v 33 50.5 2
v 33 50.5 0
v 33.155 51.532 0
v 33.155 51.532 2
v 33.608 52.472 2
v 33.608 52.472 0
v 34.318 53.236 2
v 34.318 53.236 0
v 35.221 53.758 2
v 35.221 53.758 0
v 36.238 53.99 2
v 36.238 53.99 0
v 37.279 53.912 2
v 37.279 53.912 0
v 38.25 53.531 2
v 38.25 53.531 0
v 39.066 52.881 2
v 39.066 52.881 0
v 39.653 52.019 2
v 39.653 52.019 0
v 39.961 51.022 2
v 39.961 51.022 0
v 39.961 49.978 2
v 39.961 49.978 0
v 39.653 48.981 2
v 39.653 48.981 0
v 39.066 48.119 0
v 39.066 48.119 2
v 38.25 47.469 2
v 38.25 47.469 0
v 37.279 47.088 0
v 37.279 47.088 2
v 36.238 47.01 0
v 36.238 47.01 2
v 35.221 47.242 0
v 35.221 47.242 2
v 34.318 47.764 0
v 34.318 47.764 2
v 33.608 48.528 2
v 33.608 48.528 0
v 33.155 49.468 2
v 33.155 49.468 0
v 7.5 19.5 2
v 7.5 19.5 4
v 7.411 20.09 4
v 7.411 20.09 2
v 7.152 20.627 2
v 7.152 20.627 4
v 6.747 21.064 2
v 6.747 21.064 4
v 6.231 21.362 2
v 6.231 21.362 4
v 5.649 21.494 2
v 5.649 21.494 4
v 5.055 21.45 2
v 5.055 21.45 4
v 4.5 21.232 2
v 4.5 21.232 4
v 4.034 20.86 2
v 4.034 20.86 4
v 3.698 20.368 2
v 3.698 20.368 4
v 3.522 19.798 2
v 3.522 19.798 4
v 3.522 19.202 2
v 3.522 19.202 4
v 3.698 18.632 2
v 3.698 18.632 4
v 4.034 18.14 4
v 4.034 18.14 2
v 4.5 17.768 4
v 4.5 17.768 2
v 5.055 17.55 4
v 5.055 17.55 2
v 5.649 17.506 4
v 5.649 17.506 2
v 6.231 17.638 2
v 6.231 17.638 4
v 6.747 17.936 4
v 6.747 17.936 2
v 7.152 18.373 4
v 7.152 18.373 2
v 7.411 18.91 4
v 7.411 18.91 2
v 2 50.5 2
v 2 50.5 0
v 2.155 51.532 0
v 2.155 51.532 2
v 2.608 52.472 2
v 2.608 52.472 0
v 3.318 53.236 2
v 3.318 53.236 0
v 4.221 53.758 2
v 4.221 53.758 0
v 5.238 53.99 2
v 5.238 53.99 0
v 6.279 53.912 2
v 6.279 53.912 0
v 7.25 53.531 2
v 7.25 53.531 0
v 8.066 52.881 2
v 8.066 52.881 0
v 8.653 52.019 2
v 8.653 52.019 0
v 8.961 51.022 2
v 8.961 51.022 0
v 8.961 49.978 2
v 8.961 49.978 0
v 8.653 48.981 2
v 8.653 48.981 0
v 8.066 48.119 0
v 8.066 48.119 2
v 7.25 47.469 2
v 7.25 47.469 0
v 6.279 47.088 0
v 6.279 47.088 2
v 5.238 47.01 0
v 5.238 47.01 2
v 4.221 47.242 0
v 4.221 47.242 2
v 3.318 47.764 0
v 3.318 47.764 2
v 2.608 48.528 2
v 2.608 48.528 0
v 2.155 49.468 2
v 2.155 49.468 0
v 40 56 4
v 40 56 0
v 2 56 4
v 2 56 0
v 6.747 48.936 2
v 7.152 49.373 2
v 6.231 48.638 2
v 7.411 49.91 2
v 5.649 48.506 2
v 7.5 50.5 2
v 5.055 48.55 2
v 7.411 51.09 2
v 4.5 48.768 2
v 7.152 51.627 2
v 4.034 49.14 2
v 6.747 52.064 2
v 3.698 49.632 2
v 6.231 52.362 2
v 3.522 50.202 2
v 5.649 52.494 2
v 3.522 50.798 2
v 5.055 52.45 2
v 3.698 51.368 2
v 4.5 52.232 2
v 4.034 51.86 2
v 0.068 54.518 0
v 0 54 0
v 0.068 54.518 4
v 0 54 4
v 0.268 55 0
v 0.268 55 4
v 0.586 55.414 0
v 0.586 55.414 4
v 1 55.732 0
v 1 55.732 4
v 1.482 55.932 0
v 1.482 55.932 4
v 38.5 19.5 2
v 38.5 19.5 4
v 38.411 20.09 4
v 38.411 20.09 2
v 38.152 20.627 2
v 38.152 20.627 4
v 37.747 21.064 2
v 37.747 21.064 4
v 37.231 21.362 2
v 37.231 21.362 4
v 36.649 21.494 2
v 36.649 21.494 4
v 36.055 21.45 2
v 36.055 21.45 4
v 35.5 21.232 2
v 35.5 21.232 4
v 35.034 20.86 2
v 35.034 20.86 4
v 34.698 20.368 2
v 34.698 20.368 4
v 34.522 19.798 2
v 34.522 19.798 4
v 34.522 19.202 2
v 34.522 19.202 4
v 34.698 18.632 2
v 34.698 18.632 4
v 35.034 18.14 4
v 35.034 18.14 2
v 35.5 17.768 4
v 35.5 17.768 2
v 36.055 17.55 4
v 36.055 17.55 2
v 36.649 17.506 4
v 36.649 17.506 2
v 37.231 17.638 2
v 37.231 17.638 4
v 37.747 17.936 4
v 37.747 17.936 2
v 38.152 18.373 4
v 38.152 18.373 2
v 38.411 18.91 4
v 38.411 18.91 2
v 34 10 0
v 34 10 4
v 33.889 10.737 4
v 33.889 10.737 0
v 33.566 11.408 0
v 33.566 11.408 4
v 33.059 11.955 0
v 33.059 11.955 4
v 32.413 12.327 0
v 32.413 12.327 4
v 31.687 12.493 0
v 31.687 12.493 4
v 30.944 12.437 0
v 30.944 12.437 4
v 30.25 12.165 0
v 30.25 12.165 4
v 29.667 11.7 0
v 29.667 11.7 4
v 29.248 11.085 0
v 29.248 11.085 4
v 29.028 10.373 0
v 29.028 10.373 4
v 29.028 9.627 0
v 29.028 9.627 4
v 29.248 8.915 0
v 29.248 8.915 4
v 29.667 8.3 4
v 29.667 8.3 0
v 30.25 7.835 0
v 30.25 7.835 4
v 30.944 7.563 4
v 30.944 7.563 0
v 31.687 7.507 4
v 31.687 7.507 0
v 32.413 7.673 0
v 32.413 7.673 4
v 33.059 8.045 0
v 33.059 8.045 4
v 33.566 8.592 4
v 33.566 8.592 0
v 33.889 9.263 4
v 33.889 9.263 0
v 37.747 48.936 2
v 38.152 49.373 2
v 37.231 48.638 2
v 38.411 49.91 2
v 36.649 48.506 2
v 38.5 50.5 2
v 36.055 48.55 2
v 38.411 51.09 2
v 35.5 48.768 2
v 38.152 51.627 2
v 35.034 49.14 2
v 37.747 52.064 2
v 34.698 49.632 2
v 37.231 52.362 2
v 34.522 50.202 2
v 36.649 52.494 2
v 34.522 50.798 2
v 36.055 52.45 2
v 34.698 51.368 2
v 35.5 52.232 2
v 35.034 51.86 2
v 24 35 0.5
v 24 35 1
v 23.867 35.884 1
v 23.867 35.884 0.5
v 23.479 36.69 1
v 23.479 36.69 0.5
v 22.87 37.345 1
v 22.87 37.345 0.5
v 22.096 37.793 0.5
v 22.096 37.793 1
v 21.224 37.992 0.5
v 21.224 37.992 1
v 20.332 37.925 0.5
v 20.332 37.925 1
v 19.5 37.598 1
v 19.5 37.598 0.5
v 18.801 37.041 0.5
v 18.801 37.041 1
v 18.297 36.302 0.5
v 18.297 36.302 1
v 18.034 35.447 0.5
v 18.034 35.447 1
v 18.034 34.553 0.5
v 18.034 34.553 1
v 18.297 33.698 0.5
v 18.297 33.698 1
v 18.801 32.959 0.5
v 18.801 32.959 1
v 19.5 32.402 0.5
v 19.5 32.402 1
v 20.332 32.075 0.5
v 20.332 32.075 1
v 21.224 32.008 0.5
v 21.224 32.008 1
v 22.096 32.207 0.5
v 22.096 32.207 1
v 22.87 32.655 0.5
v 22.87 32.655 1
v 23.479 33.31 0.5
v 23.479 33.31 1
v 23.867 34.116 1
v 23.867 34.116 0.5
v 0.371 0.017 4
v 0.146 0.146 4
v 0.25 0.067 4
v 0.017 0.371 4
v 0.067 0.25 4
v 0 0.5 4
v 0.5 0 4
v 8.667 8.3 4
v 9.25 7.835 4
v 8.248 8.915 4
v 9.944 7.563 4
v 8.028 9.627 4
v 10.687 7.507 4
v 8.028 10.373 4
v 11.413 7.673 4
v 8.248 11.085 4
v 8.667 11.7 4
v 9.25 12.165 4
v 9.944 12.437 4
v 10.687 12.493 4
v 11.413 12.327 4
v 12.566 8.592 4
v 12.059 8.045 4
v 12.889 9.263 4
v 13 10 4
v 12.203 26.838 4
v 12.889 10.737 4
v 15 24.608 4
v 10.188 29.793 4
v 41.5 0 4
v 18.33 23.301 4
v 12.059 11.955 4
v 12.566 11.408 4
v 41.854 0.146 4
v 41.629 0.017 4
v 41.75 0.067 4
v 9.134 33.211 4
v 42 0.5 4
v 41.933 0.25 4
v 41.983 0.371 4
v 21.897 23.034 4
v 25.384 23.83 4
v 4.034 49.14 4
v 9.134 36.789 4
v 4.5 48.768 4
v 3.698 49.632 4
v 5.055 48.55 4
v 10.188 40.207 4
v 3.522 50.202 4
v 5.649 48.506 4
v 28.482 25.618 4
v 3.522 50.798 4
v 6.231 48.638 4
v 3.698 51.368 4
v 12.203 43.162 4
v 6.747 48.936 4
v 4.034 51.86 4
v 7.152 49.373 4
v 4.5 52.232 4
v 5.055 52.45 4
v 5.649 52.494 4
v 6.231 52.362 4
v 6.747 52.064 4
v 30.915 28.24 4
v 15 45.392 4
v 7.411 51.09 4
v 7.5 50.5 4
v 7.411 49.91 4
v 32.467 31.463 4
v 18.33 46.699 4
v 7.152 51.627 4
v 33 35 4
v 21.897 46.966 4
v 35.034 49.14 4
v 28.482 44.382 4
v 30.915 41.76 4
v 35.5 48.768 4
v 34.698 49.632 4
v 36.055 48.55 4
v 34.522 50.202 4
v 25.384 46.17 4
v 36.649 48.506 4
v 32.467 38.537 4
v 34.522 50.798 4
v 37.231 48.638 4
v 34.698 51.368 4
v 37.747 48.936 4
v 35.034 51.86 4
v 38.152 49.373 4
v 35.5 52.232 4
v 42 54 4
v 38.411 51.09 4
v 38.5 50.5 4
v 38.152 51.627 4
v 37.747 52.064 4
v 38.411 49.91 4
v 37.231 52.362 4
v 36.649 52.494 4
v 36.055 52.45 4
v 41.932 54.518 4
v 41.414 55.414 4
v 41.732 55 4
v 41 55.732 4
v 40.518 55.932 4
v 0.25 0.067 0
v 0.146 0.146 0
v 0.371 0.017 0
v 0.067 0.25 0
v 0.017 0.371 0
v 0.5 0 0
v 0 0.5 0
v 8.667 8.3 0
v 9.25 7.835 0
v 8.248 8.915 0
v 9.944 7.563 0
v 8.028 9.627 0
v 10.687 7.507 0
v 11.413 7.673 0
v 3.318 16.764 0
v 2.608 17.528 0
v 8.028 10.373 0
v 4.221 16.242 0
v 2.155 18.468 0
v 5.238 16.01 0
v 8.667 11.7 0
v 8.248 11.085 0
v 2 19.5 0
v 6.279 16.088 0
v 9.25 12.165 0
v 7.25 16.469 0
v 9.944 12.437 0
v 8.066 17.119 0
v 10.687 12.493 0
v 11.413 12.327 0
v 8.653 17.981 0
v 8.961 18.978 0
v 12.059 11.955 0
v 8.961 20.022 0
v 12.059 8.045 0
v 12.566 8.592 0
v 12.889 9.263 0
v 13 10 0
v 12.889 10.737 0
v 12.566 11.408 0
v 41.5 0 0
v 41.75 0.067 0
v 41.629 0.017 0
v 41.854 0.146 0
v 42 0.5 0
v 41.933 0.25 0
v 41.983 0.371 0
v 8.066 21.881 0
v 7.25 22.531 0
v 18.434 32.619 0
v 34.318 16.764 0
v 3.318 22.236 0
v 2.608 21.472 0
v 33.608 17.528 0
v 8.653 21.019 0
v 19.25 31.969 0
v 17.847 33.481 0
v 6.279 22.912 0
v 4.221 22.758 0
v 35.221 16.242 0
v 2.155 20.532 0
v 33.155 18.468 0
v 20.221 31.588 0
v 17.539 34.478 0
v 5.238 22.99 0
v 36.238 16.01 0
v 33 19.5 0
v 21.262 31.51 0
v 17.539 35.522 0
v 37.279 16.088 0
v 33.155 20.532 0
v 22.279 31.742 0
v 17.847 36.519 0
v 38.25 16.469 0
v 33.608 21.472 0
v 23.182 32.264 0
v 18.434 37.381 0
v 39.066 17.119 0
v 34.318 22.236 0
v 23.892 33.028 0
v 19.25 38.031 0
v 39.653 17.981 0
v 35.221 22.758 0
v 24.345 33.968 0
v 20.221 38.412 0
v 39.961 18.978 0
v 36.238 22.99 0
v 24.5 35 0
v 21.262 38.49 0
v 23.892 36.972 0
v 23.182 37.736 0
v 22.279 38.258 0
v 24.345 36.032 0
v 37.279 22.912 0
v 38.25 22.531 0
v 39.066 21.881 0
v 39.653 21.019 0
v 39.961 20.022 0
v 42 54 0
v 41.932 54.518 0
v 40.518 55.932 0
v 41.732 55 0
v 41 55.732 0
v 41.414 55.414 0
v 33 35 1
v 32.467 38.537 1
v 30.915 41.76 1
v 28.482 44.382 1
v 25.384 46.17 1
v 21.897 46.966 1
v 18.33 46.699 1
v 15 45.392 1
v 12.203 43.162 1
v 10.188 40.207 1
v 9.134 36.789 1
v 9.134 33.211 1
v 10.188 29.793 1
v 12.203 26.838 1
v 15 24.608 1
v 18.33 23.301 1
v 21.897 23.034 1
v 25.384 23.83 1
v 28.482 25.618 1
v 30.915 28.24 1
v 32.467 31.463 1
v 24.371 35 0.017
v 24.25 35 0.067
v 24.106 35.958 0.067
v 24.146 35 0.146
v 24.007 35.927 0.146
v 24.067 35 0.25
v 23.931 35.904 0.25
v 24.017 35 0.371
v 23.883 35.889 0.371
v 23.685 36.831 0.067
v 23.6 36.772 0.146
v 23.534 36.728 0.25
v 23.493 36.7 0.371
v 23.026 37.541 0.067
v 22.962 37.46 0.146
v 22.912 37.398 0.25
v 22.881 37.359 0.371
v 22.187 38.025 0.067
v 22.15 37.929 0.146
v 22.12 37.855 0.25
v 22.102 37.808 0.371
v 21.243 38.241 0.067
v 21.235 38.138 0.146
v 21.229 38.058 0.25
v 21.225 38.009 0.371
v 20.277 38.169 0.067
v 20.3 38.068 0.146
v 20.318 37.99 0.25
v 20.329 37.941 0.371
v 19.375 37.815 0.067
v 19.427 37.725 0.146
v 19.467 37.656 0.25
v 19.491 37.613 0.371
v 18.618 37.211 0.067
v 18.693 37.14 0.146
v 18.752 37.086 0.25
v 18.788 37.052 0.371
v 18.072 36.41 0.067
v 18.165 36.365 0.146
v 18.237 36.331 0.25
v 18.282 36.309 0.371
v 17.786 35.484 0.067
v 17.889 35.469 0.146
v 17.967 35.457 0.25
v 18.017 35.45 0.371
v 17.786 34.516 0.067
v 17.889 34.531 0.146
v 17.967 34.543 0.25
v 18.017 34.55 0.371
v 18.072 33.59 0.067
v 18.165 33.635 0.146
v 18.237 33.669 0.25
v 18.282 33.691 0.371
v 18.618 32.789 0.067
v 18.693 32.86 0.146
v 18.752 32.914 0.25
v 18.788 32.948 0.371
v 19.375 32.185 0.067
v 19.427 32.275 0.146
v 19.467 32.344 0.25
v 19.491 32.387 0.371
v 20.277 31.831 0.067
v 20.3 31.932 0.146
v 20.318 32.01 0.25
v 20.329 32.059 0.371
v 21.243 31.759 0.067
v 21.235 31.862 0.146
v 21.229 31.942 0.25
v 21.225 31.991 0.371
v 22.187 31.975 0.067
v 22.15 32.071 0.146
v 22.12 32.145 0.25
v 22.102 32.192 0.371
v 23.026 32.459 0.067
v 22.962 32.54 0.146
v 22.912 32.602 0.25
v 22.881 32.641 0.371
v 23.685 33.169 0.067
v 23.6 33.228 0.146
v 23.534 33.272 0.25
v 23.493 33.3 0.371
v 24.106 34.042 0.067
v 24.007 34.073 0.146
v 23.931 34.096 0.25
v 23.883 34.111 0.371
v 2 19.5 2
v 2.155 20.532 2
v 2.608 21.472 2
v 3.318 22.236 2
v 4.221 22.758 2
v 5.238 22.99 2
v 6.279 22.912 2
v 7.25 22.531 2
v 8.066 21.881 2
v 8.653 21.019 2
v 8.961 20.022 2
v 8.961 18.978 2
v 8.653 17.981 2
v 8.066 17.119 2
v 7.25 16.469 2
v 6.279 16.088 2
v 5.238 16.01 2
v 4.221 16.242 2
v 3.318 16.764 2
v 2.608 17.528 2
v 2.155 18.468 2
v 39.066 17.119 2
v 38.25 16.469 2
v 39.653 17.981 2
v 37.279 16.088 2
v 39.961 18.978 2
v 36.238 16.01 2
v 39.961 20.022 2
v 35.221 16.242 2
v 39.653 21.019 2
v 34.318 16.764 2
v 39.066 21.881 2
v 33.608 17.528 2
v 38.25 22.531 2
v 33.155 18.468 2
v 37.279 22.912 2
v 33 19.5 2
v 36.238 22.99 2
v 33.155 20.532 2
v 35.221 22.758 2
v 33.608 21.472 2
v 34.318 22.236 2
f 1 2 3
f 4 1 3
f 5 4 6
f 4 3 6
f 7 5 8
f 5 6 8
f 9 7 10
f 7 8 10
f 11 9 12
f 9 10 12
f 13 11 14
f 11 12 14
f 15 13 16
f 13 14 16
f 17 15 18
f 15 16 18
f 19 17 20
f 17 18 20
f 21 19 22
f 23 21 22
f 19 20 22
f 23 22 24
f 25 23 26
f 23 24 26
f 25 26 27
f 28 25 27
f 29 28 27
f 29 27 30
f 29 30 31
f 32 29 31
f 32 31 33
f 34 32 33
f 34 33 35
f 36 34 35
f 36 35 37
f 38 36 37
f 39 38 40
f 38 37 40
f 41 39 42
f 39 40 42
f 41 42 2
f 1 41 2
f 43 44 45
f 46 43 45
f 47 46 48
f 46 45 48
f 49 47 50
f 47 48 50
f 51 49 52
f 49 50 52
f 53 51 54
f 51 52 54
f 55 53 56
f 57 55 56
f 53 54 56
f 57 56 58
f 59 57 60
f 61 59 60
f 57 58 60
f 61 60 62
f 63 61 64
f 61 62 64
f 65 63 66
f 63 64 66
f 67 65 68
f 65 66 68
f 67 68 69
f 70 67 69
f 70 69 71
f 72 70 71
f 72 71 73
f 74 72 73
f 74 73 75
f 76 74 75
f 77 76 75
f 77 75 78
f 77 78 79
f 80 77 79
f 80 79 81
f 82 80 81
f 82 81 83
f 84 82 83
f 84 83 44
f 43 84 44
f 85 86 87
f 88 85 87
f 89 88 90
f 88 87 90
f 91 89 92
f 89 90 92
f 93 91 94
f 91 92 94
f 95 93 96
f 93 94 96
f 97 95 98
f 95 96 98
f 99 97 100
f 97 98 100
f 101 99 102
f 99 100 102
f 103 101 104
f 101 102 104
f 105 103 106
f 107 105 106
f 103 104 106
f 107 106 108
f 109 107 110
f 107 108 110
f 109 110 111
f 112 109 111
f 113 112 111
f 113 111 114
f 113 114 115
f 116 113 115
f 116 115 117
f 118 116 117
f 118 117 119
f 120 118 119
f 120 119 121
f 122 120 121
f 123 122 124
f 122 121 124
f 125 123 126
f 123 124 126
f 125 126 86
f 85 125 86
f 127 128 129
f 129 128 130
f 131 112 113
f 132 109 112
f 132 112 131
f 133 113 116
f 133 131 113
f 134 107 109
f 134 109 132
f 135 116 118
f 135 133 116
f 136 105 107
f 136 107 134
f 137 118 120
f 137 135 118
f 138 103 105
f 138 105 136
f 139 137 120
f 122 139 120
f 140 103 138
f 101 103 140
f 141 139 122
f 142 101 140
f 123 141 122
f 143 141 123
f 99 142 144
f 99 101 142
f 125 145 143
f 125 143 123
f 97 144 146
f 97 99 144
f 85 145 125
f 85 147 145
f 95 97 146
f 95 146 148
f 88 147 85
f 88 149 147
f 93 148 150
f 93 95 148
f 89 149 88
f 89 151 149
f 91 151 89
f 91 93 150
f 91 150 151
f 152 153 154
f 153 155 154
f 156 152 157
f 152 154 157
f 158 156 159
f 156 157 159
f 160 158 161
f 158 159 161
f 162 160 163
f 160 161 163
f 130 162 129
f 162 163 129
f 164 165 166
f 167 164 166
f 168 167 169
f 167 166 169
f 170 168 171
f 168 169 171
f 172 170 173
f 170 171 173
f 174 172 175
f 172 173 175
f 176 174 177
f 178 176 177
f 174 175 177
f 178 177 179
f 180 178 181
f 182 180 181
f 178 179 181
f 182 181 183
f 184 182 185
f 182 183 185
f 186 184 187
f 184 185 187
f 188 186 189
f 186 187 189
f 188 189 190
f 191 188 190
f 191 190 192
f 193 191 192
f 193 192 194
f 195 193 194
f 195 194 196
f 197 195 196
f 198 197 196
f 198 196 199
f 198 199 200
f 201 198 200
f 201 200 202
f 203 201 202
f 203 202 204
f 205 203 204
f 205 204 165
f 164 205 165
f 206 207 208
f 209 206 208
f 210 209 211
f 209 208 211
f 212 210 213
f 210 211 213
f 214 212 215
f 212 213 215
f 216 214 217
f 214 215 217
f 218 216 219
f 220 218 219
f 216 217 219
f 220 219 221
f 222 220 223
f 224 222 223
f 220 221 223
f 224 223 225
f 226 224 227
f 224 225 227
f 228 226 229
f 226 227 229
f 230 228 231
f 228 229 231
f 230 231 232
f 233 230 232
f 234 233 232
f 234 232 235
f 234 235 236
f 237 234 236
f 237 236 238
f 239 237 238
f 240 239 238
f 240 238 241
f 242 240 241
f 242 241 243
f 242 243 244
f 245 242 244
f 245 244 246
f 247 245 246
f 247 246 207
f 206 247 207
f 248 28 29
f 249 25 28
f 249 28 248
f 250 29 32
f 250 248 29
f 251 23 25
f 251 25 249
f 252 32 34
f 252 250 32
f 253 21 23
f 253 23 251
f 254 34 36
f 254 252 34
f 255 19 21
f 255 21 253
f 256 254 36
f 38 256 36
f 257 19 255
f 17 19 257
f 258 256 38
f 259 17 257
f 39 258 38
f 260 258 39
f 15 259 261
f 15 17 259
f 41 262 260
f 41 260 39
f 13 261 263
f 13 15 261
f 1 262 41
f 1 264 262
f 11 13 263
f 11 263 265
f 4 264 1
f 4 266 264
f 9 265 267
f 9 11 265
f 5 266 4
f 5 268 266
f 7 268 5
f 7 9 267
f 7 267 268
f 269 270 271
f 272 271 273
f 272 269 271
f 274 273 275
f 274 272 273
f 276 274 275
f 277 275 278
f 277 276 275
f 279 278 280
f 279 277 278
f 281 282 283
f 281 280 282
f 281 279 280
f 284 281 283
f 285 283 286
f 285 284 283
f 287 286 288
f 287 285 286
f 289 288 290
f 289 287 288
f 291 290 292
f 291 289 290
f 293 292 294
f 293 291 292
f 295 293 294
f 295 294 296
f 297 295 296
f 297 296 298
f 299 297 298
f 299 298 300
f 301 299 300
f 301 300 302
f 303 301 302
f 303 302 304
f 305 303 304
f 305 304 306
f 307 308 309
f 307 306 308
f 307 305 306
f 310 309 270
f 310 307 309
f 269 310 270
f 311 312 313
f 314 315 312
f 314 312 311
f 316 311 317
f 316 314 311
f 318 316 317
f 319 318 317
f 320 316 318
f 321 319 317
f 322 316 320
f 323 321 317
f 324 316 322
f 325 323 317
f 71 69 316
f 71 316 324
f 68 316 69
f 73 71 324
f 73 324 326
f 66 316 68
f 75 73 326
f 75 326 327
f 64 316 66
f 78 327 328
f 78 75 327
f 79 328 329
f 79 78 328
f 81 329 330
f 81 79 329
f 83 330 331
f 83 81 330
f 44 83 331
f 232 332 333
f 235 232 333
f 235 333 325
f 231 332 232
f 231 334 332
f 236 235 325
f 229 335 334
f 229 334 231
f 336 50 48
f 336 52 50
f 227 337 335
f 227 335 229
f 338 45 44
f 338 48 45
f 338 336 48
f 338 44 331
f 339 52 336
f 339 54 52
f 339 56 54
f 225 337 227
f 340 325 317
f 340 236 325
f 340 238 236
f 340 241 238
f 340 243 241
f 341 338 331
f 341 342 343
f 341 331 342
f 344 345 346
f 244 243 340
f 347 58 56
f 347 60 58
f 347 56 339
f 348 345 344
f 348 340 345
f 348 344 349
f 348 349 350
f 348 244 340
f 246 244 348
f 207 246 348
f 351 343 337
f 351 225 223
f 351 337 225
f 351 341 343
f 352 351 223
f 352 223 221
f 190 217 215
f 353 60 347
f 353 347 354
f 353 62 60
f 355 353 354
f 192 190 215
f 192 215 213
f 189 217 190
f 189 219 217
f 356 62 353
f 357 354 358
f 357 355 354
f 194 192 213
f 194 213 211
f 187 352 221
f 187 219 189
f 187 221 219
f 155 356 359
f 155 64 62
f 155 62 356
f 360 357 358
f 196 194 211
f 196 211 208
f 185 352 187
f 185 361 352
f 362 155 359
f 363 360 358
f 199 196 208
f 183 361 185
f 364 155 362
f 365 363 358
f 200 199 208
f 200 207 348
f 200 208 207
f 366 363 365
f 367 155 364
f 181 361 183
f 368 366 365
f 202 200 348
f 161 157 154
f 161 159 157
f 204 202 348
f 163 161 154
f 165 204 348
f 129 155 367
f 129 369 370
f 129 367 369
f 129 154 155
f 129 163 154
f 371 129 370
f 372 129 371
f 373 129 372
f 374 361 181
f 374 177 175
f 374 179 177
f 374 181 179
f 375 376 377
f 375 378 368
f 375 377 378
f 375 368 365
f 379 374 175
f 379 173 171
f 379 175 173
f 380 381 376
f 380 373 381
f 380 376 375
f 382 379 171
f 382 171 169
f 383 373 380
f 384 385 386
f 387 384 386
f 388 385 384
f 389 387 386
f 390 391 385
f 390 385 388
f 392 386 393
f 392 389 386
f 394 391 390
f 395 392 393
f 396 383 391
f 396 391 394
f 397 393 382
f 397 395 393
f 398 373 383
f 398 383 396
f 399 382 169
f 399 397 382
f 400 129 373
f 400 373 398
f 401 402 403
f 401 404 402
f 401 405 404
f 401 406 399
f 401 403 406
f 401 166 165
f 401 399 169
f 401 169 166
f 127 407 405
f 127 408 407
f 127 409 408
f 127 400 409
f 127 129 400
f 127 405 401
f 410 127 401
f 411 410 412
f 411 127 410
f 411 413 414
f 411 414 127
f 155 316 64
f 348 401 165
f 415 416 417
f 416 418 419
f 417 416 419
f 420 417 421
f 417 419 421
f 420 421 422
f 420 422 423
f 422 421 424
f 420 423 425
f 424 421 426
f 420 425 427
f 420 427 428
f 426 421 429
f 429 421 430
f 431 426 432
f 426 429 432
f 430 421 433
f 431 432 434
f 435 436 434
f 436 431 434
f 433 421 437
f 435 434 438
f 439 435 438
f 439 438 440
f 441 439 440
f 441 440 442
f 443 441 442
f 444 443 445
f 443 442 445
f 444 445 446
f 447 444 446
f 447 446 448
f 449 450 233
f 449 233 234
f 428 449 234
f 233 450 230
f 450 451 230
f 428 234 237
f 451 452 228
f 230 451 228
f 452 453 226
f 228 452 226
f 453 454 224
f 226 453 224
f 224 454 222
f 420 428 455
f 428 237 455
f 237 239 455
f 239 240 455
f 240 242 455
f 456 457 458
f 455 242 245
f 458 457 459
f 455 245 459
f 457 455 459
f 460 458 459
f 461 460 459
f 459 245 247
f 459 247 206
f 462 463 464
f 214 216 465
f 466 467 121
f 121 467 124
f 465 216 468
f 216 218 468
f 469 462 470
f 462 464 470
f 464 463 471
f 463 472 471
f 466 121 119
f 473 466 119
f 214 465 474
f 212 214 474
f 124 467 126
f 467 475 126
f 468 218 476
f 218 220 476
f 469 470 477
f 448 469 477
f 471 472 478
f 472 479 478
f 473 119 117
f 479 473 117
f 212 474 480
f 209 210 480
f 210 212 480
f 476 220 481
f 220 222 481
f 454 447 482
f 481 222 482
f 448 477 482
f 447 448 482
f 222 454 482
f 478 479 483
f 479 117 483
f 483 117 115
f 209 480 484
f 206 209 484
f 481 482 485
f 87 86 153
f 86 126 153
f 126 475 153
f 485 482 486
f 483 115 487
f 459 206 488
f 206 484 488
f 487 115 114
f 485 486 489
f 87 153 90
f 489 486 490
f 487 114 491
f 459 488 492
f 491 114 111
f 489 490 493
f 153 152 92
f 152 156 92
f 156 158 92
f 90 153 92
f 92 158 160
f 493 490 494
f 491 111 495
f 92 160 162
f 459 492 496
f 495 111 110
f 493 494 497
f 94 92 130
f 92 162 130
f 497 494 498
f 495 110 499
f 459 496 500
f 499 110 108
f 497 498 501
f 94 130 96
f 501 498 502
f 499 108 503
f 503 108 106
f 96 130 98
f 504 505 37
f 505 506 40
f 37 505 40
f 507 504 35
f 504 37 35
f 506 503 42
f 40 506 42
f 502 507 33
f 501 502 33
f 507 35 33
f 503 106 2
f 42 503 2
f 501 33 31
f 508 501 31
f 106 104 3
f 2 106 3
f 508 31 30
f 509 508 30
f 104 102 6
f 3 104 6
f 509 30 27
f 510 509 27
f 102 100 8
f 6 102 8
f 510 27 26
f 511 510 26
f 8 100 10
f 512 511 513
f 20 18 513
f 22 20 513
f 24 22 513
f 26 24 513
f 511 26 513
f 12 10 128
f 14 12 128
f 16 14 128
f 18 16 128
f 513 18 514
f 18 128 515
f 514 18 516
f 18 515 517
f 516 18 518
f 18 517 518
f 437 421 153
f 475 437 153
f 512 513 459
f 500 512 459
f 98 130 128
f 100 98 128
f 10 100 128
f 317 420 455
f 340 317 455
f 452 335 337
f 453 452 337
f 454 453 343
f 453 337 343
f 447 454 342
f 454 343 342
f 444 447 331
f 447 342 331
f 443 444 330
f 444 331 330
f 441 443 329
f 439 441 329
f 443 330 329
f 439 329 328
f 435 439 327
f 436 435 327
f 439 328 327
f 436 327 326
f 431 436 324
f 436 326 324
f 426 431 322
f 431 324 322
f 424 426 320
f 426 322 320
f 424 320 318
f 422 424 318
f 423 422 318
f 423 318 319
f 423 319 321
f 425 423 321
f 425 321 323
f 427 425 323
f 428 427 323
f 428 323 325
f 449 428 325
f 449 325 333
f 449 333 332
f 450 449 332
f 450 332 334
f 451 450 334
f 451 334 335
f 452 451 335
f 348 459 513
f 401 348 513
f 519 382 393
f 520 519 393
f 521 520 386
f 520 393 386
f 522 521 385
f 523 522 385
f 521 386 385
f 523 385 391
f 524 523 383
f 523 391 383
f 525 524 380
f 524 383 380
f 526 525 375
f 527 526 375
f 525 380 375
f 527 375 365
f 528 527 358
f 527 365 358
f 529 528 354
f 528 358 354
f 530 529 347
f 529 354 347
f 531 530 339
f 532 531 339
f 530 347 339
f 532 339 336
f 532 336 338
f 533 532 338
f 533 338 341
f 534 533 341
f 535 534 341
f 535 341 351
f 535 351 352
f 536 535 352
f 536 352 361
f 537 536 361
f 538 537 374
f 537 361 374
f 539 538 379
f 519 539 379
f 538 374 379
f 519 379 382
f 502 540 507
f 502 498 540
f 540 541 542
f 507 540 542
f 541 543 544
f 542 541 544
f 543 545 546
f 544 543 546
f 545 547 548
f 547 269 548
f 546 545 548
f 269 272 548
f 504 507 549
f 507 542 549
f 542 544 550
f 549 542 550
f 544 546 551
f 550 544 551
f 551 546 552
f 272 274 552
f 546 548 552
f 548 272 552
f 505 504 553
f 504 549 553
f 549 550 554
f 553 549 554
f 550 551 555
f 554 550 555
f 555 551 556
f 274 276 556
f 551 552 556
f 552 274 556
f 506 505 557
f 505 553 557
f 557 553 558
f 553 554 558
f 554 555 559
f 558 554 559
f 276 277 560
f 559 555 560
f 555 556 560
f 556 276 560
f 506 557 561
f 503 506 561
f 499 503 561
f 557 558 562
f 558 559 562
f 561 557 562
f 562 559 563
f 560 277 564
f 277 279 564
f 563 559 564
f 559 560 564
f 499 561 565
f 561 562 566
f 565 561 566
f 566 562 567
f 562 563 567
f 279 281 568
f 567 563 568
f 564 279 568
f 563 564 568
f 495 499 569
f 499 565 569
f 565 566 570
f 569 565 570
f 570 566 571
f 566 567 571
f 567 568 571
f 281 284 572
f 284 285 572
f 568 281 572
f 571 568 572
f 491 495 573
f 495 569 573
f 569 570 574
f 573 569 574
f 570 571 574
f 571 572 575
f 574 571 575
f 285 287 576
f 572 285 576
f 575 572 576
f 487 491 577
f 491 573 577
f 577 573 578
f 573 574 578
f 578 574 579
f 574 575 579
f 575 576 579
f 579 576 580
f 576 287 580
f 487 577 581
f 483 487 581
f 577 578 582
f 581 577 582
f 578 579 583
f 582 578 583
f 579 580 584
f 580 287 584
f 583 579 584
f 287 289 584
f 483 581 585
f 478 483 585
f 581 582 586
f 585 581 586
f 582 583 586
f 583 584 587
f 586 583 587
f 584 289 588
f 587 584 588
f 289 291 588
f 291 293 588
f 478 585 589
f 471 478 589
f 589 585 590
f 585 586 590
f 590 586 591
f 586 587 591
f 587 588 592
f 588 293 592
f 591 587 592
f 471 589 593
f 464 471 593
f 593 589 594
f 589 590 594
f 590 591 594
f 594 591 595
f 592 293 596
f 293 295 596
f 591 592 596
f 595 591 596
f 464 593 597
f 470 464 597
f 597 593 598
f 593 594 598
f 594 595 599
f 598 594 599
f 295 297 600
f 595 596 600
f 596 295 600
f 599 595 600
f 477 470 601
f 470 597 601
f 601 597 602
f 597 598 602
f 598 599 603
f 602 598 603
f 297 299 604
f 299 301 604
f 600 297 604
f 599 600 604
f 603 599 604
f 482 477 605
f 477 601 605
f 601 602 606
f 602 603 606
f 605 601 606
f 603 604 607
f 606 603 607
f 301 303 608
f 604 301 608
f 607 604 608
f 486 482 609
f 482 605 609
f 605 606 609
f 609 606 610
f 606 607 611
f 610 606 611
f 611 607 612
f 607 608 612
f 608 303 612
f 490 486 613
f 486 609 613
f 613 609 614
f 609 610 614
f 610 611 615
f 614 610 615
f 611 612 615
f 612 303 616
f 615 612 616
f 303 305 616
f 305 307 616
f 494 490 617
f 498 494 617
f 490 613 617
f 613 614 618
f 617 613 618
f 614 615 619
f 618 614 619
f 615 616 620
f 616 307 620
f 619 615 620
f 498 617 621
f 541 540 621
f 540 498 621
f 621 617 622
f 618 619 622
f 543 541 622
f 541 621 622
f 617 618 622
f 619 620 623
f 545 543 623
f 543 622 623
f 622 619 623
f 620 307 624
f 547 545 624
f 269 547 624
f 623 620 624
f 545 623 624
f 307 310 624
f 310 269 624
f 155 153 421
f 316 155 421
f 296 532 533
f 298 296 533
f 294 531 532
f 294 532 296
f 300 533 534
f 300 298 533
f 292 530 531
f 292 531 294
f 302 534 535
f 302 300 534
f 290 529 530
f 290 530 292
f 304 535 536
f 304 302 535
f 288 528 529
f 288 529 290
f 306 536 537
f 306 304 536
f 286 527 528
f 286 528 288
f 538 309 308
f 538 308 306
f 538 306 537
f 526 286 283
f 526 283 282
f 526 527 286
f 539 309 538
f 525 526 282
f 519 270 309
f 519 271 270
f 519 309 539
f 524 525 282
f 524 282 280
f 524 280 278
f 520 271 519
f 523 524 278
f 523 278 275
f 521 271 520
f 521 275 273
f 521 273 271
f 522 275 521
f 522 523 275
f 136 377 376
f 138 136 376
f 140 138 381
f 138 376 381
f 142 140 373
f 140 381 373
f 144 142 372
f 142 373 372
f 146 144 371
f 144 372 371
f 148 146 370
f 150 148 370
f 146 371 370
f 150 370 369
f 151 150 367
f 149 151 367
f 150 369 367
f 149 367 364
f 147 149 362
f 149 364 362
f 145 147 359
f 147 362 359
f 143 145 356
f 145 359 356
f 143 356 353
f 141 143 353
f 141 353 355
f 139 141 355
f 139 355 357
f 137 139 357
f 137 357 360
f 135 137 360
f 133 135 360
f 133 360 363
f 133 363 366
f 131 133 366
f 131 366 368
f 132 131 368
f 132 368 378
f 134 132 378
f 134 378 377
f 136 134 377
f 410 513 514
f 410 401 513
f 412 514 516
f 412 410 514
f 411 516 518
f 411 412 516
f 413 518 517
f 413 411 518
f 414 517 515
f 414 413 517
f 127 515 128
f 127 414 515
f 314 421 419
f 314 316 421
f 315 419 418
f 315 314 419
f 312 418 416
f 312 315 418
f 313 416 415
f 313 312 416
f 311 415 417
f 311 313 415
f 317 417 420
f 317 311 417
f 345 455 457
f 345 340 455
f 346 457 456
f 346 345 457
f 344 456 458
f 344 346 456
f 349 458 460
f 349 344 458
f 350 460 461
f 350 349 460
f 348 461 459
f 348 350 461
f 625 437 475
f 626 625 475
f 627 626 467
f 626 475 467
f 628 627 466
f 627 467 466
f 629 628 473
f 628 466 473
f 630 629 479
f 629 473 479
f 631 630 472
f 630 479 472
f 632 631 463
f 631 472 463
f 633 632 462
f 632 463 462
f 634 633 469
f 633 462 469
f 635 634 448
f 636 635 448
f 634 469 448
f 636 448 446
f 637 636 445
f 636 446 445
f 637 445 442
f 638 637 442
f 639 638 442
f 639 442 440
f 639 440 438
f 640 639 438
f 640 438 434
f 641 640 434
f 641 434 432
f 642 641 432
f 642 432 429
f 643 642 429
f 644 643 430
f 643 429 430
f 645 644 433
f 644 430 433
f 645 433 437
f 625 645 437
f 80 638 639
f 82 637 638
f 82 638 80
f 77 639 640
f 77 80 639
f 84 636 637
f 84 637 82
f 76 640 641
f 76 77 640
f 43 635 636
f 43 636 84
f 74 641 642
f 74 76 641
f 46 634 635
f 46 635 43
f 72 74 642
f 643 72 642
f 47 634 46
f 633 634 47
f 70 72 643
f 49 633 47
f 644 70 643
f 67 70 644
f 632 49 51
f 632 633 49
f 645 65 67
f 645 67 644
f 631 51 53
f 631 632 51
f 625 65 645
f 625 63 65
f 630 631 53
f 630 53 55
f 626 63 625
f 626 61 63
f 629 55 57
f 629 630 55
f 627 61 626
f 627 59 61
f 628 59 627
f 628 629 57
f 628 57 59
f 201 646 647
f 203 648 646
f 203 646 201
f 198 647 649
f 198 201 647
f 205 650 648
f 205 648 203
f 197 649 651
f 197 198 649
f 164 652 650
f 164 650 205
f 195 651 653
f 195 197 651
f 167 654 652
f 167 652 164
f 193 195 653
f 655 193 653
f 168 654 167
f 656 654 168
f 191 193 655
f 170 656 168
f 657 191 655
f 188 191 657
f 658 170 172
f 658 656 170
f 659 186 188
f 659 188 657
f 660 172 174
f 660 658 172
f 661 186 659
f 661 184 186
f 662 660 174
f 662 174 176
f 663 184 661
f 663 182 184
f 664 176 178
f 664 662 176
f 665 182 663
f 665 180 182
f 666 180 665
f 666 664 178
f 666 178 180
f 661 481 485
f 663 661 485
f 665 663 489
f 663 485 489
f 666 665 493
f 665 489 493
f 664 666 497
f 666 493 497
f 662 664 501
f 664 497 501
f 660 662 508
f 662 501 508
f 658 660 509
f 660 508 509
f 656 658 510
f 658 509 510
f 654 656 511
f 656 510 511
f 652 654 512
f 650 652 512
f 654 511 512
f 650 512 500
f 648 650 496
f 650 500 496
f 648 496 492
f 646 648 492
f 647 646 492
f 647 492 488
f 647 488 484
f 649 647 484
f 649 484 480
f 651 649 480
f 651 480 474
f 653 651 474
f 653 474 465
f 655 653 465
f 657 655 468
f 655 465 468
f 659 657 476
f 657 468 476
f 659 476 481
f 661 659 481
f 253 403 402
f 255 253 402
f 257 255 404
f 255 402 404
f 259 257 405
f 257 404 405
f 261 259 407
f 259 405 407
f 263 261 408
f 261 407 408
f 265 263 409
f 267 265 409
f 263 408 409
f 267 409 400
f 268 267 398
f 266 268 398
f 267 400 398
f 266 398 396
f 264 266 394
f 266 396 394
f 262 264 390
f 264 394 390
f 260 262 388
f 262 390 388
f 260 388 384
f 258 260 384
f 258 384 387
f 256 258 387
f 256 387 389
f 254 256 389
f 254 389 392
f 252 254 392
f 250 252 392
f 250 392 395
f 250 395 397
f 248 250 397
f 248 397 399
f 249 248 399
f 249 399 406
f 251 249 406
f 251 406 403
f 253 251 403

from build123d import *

# Parameters (mm, degrees)
SKETCH1_R           = 2.999999999
BOSS_EXTRUDE1_DEPTH = 4
SKETCH5_R           = 12
CUT_EXTRUDE1_DEPTH  = 3
FILLET1_R           = 2
FILLET2_R           = 0.5
FILLET3_R           = 0.5
SKETCH6_R           = 2.5
CUT_EXTRUDE2_DEPTH  = 10
SKETCH7_R           = 2
CUT_EXTRUDE3_DEPTH  = 10
SKETCH8_R           = 3.5
CUT_EXTRUDE4_DEPTH  = 2


with BuildPart() as part:
    # Sketch1 → Boss-Extrude1 (new body)
    with BuildSketch(Plane.XY):
        Polygon((0, 0), (42, 0), (42, 51.371572875), (42, 56), (37.371572875, 56), (4.628427125, 56), (0, 56), align=None)
        with Locations((21, 35)):
            Circle(SKETCH1_R, mode=Mode.SUBTRACT)
    extrude(amount=BOSS_EXTRUDE1_DEPTH)

    # Sketch5 → Cut-Extrude1 (cut)
    with BuildSketch(Plane.XY.offset(4)):
        with Locations((21, 35)):
            Circle(SKETCH5_R)
    extrude(amount=-CUT_EXTRUDE1_DEPTH, mode=Mode.SUBTRACT)

    # Fillet1
    fillet1_edges = [part.edges().sort_by_distance(p)[0] for p in [
        (0, 56, 2),
        (42, 56, 2),
    ]]
    fillet(fillet1_edges, radius=FILLET1_R)

    # Fillet2
    fillet2_edges = [part.edges().sort_by_distance(p)[0] for p in [
        (42, 0, 2),
        (0, 0, 2),
    ]]
    fillet(fillet2_edges, radius=FILLET2_R)

    # Fillet3
    fillet3_edges = [part.edges().sort_by_distance(p)[0] for p in [
        (18.000000001, 35, 0),
    ]]
    fillet(fillet3_edges, radius=FILLET3_R)

    # Sketch6 → Cut-Extrude2 (cut)
    with BuildSketch(Plane.XY.offset(4)):
        with Locations((10.5, 10)):
            Circle(SKETCH6_R)
        with Locations((31.5, 10)):
            Circle(SKETCH6_R)
    extrude(amount=-CUT_EXTRUDE2_DEPTH, mode=Mode.SUBTRACT)

    # Sketch7 → Cut-Extrude3 (cut)
    with BuildSketch(Plane.XY.offset(4)):
        with Locations((5.5, 50.5)):
            Circle(SKETCH7_R)
        with Locations((5.5, 19.5)):
            Circle(SKETCH7_R)
        with Locations((36.5, 19.5)):
            Circle(SKETCH7_R)
        with Locations((36.5, 50.5)):
            Circle(SKETCH7_R)
    extrude(amount=-CUT_EXTRUDE3_DEPTH, mode=Mode.SUBTRACT)

    # Sketch8 → Cut-Extrude4 (cut)
    with BuildSketch(Plane(origin=(0, 0, 0), x_dir=(-1, 0, 0), z_dir=(0, 0, -1))):
        with Locations((-36.5, 50.5)):
            Circle(SKETCH8_R)
        with Locations((-36.5, 19.5)):
            Circle(SKETCH8_R)
        with Locations((-5.5, 19.5)):
            Circle(SKETCH8_R)
        with Locations((-5.5, 50.5)):
            Circle(SKETCH8_R)
    extrude(amount=-CUT_EXTRUDE4_DEPTH, mode=Mode.SUBTRACT)


solid = part.part
